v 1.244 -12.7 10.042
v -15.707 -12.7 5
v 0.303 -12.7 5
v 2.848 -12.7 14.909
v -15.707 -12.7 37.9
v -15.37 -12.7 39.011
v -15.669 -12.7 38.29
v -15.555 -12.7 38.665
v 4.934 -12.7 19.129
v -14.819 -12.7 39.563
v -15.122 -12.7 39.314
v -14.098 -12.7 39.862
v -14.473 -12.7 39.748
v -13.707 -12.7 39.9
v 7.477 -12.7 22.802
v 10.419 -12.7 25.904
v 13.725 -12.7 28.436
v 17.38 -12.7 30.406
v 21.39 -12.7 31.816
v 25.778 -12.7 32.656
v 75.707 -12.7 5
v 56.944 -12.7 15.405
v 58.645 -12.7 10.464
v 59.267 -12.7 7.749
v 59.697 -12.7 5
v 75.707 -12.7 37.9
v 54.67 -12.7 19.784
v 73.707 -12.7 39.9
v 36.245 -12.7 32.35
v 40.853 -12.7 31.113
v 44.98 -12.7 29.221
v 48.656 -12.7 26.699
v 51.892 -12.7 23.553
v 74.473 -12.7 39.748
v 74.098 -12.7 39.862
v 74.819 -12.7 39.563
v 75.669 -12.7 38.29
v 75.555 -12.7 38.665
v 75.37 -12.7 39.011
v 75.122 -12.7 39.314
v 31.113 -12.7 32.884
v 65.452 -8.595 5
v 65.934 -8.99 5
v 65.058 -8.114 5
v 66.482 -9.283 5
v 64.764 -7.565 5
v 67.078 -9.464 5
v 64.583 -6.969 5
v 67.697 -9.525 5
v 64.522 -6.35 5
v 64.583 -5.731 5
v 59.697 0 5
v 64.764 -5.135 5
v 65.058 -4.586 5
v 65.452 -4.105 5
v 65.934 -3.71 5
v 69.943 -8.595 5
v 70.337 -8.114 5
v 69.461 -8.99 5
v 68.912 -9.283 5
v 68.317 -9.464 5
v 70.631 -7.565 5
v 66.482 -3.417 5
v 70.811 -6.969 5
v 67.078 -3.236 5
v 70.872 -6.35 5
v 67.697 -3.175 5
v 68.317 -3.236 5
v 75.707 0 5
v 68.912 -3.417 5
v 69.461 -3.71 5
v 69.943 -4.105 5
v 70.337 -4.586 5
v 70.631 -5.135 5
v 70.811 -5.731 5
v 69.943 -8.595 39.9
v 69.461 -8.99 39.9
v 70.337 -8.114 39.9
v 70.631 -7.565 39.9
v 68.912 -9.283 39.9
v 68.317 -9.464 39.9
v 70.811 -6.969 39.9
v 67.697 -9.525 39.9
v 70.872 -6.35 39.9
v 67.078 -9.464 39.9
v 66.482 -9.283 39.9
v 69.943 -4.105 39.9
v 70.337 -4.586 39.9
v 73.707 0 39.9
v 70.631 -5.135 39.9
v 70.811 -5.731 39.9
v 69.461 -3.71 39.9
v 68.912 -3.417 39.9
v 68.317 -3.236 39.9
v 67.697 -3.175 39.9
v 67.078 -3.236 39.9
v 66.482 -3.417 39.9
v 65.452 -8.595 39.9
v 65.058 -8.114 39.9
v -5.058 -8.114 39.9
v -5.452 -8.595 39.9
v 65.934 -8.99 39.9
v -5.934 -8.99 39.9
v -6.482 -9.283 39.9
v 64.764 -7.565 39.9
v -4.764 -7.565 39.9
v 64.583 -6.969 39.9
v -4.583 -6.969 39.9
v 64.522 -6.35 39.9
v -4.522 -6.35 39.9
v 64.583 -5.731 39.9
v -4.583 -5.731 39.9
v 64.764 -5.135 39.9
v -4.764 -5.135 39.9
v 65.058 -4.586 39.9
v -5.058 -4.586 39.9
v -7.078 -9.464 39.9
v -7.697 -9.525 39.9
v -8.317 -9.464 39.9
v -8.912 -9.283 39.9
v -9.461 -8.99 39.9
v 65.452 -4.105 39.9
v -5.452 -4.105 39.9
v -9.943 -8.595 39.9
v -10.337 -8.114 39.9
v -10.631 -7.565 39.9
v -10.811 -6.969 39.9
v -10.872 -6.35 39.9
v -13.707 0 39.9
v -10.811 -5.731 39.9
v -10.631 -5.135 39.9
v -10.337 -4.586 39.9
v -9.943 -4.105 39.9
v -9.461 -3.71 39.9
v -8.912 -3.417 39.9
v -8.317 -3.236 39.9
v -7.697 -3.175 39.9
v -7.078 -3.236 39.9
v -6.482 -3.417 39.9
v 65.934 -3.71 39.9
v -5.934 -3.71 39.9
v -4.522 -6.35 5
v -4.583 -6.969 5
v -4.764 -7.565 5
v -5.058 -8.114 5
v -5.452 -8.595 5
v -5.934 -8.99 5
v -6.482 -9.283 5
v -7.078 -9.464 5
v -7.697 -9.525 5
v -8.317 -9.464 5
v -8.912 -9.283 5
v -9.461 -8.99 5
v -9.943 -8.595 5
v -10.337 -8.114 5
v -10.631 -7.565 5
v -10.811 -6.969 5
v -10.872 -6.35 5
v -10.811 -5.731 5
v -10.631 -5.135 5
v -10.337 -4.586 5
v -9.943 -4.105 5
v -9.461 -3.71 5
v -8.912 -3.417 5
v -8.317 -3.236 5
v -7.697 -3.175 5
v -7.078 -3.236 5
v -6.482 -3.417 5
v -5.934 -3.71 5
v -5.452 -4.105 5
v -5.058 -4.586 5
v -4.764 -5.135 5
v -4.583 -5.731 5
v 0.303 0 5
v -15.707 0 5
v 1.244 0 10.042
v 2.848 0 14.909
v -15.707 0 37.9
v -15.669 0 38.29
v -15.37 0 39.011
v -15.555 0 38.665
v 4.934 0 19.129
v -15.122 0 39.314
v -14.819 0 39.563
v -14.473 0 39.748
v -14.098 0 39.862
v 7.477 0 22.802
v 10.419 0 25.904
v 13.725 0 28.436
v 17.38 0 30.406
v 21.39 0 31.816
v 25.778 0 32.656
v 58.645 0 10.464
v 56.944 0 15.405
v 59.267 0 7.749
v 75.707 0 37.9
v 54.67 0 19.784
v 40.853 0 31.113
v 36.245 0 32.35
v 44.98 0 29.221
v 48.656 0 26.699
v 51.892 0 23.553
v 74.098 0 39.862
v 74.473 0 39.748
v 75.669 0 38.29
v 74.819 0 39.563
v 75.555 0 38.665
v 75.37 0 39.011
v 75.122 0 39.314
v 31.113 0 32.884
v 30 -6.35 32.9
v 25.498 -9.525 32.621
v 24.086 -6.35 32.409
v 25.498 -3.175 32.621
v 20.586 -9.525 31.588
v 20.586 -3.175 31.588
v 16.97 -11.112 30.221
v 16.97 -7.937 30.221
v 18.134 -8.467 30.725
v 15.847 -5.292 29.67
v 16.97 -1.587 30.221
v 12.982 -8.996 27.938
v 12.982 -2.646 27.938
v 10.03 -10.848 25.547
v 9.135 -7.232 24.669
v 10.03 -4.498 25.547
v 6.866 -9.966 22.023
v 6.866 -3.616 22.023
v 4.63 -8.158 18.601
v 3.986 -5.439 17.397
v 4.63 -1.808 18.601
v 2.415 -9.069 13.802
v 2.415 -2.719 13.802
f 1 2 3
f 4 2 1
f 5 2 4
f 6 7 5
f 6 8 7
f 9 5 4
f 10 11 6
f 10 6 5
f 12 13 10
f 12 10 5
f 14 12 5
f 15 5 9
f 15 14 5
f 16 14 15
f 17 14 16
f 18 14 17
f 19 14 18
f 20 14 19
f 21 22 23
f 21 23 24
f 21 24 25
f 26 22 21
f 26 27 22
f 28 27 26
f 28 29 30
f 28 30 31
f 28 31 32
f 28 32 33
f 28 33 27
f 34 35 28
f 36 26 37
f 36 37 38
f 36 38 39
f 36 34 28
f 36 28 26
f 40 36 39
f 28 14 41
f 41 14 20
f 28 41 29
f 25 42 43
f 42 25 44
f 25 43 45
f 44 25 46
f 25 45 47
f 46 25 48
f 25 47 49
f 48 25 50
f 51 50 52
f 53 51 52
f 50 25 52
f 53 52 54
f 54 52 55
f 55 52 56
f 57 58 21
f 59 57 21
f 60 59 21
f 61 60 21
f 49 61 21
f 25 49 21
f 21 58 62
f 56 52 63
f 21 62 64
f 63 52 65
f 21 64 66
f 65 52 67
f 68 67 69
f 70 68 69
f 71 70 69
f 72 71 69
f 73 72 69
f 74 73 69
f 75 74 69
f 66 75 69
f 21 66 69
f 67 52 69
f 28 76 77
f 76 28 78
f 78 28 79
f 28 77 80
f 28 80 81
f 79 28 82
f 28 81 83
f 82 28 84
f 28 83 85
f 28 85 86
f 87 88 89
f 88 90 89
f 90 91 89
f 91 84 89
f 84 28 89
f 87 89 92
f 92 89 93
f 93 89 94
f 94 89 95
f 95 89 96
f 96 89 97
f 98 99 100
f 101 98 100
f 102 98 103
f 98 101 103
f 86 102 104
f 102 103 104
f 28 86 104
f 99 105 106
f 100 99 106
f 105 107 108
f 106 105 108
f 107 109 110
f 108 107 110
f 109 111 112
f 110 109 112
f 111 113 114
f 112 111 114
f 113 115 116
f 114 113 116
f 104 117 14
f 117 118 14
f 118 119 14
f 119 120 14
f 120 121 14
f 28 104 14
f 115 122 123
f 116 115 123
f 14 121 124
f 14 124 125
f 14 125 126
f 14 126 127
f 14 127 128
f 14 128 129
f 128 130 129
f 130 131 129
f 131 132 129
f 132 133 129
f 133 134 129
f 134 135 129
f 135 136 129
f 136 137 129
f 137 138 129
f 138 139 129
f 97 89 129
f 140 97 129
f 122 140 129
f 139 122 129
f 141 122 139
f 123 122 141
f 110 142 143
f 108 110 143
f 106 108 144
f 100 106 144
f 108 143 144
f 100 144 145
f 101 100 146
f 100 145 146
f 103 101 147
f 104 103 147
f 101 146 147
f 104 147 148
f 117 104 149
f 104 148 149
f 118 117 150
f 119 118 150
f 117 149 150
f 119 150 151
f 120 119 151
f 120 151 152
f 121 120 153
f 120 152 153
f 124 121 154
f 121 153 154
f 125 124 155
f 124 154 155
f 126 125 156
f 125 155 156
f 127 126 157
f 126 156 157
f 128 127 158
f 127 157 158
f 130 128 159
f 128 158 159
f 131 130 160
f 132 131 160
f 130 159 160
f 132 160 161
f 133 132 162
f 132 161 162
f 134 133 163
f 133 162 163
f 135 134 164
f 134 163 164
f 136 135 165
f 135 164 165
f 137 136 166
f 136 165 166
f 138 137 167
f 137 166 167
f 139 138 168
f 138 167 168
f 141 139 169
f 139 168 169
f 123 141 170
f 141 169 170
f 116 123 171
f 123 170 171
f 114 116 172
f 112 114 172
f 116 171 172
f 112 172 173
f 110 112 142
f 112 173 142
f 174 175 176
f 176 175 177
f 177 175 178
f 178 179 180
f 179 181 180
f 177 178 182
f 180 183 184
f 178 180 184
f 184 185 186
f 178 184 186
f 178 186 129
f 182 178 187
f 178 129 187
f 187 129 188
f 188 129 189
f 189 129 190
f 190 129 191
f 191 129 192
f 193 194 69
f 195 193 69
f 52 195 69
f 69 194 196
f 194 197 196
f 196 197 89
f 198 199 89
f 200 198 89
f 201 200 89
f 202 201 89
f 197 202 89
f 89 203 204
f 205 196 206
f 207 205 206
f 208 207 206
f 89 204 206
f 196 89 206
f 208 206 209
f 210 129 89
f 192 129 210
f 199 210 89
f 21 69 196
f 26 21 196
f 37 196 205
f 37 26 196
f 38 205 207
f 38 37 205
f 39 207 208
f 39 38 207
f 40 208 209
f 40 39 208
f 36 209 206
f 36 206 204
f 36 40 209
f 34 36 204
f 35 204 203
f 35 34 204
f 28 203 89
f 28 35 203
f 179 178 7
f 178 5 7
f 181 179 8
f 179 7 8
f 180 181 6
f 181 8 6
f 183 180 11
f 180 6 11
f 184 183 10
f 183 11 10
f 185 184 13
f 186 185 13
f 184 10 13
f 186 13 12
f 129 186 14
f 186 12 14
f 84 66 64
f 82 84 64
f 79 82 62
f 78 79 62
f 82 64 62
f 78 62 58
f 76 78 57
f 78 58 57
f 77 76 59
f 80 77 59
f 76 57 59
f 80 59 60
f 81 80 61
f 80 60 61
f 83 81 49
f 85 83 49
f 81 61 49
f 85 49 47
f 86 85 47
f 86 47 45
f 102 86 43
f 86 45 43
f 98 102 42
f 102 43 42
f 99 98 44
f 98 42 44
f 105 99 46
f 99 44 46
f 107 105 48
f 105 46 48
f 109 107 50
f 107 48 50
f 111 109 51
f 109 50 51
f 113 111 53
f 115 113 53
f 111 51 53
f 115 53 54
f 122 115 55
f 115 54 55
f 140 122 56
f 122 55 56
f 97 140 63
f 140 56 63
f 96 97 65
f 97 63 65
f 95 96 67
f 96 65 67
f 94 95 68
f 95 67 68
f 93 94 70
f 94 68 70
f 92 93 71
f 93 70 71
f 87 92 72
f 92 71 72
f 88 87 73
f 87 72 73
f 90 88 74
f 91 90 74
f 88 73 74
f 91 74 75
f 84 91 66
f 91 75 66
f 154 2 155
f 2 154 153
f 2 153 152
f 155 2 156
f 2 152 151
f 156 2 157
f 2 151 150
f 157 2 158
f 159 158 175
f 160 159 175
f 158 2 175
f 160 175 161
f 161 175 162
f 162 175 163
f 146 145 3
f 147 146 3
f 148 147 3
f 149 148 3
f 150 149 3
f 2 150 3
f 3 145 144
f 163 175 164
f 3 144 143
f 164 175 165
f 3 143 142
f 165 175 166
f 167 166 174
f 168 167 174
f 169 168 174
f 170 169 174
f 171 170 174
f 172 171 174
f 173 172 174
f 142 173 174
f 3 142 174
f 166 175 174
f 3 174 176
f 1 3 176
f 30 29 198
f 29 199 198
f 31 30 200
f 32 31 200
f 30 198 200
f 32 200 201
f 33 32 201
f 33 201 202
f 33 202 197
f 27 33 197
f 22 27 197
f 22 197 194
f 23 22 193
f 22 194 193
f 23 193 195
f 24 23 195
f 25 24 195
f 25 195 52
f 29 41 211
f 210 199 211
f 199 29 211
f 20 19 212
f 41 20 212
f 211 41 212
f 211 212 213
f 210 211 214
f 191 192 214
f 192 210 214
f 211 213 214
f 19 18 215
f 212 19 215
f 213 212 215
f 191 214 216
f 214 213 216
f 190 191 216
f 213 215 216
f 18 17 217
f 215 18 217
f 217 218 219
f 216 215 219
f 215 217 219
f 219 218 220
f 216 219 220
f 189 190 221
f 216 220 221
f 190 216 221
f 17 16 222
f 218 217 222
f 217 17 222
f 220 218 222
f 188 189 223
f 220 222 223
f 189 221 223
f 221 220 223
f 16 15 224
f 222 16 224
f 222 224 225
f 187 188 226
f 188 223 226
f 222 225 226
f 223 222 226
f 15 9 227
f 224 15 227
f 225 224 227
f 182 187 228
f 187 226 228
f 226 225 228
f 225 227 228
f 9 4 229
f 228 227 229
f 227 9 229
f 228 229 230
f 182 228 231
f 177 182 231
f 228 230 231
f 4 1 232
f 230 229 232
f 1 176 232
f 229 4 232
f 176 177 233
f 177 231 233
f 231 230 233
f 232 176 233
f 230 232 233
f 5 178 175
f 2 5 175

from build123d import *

# Parameters (mm, degrees)
F1_DEPTH = 12.7
F2_R     = 3.175
F3_DEPTH = 34.9
F4_R     = 3.175
F5_DEPTH = 34.9
F6_R     = 2


with BuildPart() as f1:
    # F0 (on Front) → F1 (new body)
    with BuildSketch(Plane.XZ):
        with BuildLine():
            Line((-5.8658062685, 5), (0.3025391327, 5))
            add(Edge.make_bspline(
                [(0.3025391327, 5), (2.0272433596, 19.1776482129), (11.2100582813, 32.9), (30, 32.9)],
                knots=[4.6857722032, 4.6857722032, 4.6857722032, 4.6857722032, 44.5242630484, 44.5242630484, 44.5242630484, 44.5242630484], degree=3))
            add(Edge.make_bspline(
                [(59.6974608673, 5), (57.9727566404, 19.1776482129), (48.7899417187, 32.9), (30, 32.9)],
                knots=[4.6857722032, 4.6857722032, 4.6857722032, 4.6857722032, 44.5242630484, 44.5242630484, 44.5242630484, 44.5242630484], degree=3))
            Line((59.6974608673, 5), (65.8658062685, 5))
            add(Edge.make_bspline(
                [(65.8658062685, 5), (65.8175694138, 5.6045543906), (65.5206979037, 8.5111158621), (64.3376946497, 13.6666771768), (61.7778690019, 20.2490905933), (57.9831497379, 26.3746466103), (52.8726260404, 31.7533398634), (46.3887061881, 35.9435716124), (39.581089223, 38.4154216198), (34.9653521704, 38.8398717945), (33.0331003636, 38.9)],
                knots=[5.0019704128, 5.0019704128, 5.0019704128, 5.0019704128, 6.8206255364, 13.7629955356, 20.7886344542, 27.9249237942, 35.2442046754, 42.8555124684, 50.901123614, 56.6904025365, 56.6904025365, 56.6904025365, 56.6904025365], degree=3))
            Line((33.0331003636, 38.9), (30, 38.9))
            Line((30, 38.9), (26.9668996364, 38.9))
            add(Edge.make_bspline(
                [(-5.8658062685, 5), (-5.8175694138, 5.6045543906), (-5.5206979037, 8.5111158621), (-4.3376946497, 13.6666771768), (-1.7778690019, 20.2490905933), (2.0168502621, 26.3746466103), (7.1273739596, 31.7533398634), (13.6112938119, 35.9435716124), (20.418910777, 38.4154216198), (25.0346478296, 38.8398717945), (26.9668996364, 38.9)],
                knots=[5.0019704128, 5.0019704128, 5.0019704128, 5.0019704128, 6.8206255364, 13.7629955356, 20.7886344542, 27.9249237942, 35.2442046754, 42.8555124684, 50.901123614, 56.6904025365, 56.6904025365, 56.6904025365, 56.6904025365], degree=3))
        make_face()
        with BuildLine():
            Line((-15.7074608673, 5), (-5.8658062685, 5))
            add(Edge.make_bspline(
                [(-5.8658062685, 5), (-5.8175694138, 5.6045543906), (-5.5206979037, 8.5111158621), (-4.3376946497, 13.6666771768), (-1.7778690019, 20.2490905933), (2.0168502621, 26.3746466103), (7.1273739596, 31.7533398634), (13.6112938119, 35.9435716124), (20.418910777, 38.4154216198), (25.0346478296, 38.8398717945), (26.9668996364, 38.9)],
                knots=[5.0019704128, 5.0019704128, 5.0019704128, 5.0019704128, 6.8206255364, 13.7629955356, 20.7886344542, 27.9249237942, 35.2442046754, 42.8555124684, 50.901123614, 56.6904025365, 56.6904025365, 56.6904025365, 56.6904025365], degree=3))
            Line((26.9668996364, 38.9), (-15.7074608673, 38.9))
            Line((-15.7074608673, 38.9), (-15.7074608673, 5))
        make_face()
        with BuildLine():
            add(Edge.make_bspline(
                [(65.8658062685, 5), (65.8175694138, 5.6045543906), (65.5206979037, 8.5111158621), (64.3376946497, 13.6666771768), (61.7778690019, 20.2490905933), (57.9831497379, 26.3746466103), (52.8726260404, 31.7533398634), (46.3887061881, 35.9435716124), (39.581089223, 38.4154216198), (34.9653521704, 38.8398717945), (33.0331003636, 38.9)],
                knots=[5.0019704128, 5.0019704128, 5.0019704128, 5.0019704128, 6.8206255364, 13.7629955356, 20.7886344542, 27.9249237942, 35.2442046754, 42.8555124684, 50.901123614, 56.6904025365, 56.6904025365, 56.6904025365, 56.6904025365], degree=3))
            Line((65.8658062685, 5), (75.7074608673, 5))
            Line((75.7074608673, 5), (75.7074608673, 38.9))
            Line((75.7074608673, 38.9), (33.0331003636, 38.9))
        make_face()
        with BuildLine():
            Line((-15.7074608673, 38.9), (26.9668996364, 38.9))
            add(Edge.make_bspline(
                [(26.9668996364, 38.9), (27.9792387785, 38.9315021757), (28.9917902537, 38.9307560105), (30, 38.9)],
                knots=[56.6904025365, 56.6904025365, 56.6904025365, 56.6904025365, 59.7235029001, 59.7235029001, 59.7235029001, 59.7235029001], degree=3))
            add(Edge.make_bspline(
                [(33.0331003636, 38.9), (32.0207612215, 38.9315021757), (31.0082097463, 38.9307560105), (30, 38.9)],
                knots=[56.6904025365, 56.6904025365, 56.6904025365, 56.6904025365, 59.7235029001, 59.7235029001, 59.7235029001, 59.7235029001], degree=3))
            Line((33.0331003636, 38.9), (75.7074608673, 38.9))
            Line((75.7074608673, 38.9), (75.7074608673, 39.9))
            Line((75.7074608673, 39.9), (-15.7074608673, 39.9))
            Line((-15.7074608673, 39.9), (-15.7074608673, 38.9))
        make_face()
        with BuildLine():
            add(Edge.make_bspline(
                [(26.9668996364, 38.9), (27.9792387785, 38.9315021757), (28.9917902537, 38.9307560105), (30, 38.9)],
                knots=[56.6904025365, 56.6904025365, 56.6904025365, 56.6904025365, 59.7235029001, 59.7235029001, 59.7235029001, 59.7235029001], degree=3))
            Line((26.9668996364, 38.9), (30, 38.9))
        make_face()
        with BuildLine():
            Line((30, 38.9), (33.0331003636, 38.9))
            add(Edge.make_bspline(
                [(33.0331003636, 38.9), (32.0207612215, 38.9315021757), (31.0082097463, 38.9307560105), (30, 38.9)],
                knots=[56.6904025365, 56.6904025365, 56.6904025365, 56.6904025365, 59.7235029001, 59.7235029001, 59.7235029001, 59.7235029001], degree=3))
        make_face()
    extrude(amount=F1_DEPTH)

    # F2 (on face) → F3 (cut, through all)
    with BuildSketch(Plane(origin=(0, 0, 5), x_dir=(1, 0, 0), z_dir=(0, 0, -1))):
        with Locations((-7.6974608673, 6.35)):
            Circle(F2_R)
    extrude(amount=-F3_DEPTH, mode=Mode.SUBTRACT)

    # F4 (on face) → F5 (cut, through all)
    with BuildSketch(Plane(origin=(0, 0, 5), x_dir=(1, 0, 0), z_dir=(0, 0, -1))):
        with Locations((67.6974608673, 6.35)):
            Circle(F4_R)
    extrude(amount=-F5_DEPTH, mode=Mode.SUBTRACT)

    # F6
    f6_edges = [f1.edges().sort_by_distance(p)[0] for p in [
        (-15.707461, -6.35, 39.9),
        (75.707461, -6.35, 39.9),
    ]]
    fillet(f6_edges, radius=F6_R)


solid = f1.part
